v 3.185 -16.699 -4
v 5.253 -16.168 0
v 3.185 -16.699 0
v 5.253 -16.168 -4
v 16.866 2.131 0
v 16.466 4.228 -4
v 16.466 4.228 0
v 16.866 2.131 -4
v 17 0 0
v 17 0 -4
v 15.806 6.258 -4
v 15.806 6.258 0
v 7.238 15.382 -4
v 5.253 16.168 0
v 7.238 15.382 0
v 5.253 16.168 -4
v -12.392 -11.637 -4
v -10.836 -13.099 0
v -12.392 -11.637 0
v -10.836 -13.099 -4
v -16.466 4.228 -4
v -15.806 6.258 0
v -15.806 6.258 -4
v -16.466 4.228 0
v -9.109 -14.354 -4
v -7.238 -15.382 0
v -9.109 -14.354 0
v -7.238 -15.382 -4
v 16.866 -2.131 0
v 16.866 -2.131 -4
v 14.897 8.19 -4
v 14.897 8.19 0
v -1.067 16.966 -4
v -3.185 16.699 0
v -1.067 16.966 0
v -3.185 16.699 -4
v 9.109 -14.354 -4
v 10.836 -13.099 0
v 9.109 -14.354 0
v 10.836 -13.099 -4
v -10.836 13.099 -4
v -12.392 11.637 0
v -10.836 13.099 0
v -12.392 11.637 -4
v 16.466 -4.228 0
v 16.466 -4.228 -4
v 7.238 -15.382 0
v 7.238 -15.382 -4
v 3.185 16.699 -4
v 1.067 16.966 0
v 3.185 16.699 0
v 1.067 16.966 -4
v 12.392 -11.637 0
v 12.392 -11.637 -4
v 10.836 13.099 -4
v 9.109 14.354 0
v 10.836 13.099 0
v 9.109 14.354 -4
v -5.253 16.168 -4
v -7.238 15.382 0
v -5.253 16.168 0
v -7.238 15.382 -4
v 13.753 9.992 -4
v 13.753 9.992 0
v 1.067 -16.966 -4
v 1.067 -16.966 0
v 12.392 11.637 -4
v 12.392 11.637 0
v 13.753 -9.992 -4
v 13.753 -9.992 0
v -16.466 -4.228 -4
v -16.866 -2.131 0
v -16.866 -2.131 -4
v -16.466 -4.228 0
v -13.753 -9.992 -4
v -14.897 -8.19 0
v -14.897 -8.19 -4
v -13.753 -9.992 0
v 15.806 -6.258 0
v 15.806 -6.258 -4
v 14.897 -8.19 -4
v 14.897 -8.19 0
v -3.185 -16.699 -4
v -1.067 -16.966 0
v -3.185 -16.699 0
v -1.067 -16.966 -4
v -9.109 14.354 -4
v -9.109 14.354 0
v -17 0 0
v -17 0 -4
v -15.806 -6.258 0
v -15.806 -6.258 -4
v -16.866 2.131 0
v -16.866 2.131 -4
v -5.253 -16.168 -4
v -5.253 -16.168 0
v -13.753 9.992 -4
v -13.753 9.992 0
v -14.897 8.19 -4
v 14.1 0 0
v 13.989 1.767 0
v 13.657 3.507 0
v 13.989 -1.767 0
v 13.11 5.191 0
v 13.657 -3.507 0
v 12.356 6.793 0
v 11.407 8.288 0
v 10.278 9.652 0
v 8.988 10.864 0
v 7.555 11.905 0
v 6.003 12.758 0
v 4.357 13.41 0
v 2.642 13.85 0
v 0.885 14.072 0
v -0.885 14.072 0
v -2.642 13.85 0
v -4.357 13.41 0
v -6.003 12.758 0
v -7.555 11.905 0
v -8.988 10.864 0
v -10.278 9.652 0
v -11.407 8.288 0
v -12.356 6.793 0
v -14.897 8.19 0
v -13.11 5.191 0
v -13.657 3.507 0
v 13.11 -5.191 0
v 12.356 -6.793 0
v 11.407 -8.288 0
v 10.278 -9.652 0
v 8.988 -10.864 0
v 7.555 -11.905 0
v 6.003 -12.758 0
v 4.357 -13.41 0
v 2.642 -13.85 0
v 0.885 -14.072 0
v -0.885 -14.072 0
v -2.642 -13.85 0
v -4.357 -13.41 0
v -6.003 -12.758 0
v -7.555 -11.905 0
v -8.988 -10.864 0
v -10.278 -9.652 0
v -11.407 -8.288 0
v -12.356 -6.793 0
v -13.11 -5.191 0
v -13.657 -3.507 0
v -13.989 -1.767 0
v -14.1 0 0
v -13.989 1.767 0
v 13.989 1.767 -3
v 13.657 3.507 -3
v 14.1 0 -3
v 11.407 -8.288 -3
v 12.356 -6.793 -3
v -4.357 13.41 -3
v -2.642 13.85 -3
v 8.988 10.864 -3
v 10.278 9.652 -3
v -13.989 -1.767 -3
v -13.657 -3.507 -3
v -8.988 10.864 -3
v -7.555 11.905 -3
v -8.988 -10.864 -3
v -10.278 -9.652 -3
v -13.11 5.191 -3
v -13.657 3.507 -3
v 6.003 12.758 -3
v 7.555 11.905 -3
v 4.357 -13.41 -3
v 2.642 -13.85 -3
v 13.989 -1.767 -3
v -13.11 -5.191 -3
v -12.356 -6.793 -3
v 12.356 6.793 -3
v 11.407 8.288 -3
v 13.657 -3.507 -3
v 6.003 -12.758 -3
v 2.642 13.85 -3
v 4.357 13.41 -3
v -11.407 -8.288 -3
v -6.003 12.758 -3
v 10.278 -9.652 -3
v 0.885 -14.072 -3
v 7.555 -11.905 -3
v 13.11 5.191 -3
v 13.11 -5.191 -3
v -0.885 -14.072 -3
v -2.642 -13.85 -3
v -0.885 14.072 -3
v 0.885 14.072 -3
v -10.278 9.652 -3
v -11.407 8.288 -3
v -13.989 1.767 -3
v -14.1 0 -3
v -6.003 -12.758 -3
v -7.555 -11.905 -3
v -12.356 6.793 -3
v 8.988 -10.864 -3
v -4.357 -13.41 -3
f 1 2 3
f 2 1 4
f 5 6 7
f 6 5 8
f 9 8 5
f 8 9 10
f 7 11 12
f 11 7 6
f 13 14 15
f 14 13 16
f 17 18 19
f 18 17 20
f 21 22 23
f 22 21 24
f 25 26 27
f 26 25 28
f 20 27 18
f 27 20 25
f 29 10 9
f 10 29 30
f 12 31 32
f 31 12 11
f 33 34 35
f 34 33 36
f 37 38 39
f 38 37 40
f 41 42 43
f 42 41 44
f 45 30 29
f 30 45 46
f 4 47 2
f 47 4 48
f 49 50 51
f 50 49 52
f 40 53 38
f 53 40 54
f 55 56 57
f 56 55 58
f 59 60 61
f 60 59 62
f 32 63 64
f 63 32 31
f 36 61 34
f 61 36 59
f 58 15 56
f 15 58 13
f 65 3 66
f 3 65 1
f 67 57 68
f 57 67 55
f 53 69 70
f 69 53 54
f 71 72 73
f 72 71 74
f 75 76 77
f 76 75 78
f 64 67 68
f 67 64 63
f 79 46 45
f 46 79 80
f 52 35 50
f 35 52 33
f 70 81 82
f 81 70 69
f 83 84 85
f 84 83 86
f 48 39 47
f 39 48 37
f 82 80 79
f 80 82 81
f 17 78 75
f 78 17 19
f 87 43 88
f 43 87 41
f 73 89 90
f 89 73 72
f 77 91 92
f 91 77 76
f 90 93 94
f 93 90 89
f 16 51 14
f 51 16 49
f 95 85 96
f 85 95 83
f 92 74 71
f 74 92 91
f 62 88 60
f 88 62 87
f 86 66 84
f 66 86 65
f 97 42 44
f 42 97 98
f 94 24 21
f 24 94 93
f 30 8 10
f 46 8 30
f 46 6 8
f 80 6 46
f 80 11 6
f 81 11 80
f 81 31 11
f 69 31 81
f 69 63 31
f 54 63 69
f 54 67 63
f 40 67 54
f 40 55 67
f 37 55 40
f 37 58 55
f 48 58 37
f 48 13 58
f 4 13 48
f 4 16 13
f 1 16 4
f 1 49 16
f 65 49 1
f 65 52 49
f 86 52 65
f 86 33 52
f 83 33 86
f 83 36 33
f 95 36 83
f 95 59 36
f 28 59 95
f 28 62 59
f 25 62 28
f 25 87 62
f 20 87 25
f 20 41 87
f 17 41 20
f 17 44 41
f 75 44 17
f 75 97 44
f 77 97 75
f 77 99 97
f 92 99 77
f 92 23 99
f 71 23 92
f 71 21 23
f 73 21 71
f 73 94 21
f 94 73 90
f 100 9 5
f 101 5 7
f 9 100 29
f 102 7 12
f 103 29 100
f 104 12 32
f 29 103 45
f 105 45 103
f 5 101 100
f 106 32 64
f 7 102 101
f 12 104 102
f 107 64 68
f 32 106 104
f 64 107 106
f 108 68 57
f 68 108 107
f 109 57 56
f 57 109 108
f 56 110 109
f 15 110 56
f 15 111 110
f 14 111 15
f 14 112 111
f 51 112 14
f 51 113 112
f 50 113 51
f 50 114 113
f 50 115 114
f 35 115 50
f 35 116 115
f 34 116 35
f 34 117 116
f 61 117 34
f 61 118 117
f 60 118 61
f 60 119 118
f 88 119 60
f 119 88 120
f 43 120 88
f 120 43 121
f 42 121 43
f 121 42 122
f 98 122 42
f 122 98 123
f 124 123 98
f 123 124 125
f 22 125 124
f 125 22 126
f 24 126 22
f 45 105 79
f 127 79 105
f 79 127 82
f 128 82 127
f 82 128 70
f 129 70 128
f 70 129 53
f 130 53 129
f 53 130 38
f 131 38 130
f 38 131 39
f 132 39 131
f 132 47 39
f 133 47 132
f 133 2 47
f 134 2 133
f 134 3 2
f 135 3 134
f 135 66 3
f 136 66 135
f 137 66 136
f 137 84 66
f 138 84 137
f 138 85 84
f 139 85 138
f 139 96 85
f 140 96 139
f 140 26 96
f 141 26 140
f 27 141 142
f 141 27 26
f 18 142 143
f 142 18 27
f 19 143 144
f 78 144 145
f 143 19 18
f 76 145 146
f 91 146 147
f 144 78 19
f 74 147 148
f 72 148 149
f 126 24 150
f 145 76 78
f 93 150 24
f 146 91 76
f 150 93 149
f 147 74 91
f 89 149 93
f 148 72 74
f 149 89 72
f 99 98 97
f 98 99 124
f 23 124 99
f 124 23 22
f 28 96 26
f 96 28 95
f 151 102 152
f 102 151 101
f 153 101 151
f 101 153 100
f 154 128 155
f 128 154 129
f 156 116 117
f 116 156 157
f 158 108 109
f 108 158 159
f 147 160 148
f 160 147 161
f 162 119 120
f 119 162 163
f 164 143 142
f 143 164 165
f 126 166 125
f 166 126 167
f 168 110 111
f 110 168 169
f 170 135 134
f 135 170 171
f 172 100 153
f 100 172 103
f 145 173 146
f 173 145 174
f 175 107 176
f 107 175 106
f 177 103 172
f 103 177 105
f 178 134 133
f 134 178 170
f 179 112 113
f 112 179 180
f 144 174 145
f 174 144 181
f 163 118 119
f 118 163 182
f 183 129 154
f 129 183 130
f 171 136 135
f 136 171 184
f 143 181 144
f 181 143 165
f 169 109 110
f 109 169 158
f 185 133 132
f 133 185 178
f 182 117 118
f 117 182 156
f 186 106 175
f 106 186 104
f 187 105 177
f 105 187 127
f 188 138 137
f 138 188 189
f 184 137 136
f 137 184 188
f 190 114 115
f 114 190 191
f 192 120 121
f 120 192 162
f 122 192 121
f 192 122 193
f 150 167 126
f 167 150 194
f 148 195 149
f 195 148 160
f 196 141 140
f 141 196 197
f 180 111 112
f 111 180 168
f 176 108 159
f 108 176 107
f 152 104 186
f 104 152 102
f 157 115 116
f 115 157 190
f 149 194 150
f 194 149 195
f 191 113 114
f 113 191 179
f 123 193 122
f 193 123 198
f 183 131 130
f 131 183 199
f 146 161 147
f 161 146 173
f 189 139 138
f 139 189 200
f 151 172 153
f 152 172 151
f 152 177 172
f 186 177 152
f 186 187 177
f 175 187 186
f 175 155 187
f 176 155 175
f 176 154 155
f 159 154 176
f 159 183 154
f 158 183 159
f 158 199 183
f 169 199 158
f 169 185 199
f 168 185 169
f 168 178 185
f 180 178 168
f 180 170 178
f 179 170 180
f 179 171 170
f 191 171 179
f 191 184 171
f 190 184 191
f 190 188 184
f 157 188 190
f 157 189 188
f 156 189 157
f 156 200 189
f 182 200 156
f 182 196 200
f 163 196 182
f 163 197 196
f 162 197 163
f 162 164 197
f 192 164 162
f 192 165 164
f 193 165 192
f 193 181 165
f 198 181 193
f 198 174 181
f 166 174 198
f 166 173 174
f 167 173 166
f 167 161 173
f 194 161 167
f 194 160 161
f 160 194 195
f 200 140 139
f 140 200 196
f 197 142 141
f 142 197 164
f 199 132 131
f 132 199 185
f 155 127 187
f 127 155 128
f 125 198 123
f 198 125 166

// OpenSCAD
$fn = 50;


difference() {
	union() {
		translate(v = [0, 0, -4.0000000000]) {
			cylinder(h = 4, r = 17.0000000000);
		}
	}
	union() {
		#translate(v = [0, 0, -3.0000000000]) {
			cylinder(h = 3, r = 14.1000000000);
		}
	}
}
